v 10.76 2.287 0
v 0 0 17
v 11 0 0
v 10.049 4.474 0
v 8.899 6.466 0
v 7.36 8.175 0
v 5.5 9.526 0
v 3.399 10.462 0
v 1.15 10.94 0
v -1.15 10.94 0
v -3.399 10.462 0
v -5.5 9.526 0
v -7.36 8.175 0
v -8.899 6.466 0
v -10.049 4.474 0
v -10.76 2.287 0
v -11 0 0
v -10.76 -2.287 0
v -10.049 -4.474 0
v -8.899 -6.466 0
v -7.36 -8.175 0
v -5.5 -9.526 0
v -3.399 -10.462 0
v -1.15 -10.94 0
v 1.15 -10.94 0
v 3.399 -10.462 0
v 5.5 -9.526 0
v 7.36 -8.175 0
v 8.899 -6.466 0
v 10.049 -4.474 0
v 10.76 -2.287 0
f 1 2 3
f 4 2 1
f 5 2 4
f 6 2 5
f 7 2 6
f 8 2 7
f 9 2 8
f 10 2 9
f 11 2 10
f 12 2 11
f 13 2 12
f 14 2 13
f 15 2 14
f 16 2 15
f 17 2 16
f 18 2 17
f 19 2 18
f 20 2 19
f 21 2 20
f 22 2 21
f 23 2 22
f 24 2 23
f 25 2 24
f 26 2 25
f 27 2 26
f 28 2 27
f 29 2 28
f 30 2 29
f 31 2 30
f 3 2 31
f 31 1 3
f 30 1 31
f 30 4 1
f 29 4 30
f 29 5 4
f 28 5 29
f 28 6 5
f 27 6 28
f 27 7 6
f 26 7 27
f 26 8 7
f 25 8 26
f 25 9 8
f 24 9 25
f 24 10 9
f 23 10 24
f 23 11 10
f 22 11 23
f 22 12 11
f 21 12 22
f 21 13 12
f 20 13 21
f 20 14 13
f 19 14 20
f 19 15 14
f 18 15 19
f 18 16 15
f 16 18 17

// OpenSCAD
// Generated by SolidPython 1.0.1 on 2020-07-29 00:46:43


cylinder(h = 17, r1 = 11, r2 = 0);
/***********************************************
*********      SolidPython code:      **********
************************************************
 
# import packages: SolidPython
from solid import *
from solid.utils import *
from itertools import chain, combinations, permutations


class Resize:

    def __init__(self, scad_file):
        self.scad_file = scad_file
        #self.scad_file = import_scad(scad_file)
        # cone/cylinder param:
        self.r1 = 0
        self.r2 = 0
        self.h = 0
        # rectangular prism param:
        self.w = 0
        self.l = 0
        # ellipse param:
        self.r = 0

    # import OpenScad code (file name corresponds to shape)


    # classify shape + parameters
    def assign(self, param1, param2, param3):
        if self.scad_file == 'cone.scad':
            self.r1 = param1
            self.r2 = param2
            self.h = param3
        elif self.scad_file == 'cylinder.scad':
            self.r1 = param1
            self.r2 = param2
            self.h = param3
        elif self.scad_file == 'rectangularPrism.scad':
            self.h = param1
            self.l = param2
            self.w = param3
        else:
            self.r = param1
            self.h = param2

    # resize parameters
    def iterate(self):
        x = range(3, 20, 2)
        i = 1
        if self.scad_file == 'cone.scad':
            tempList = list(permutations(x, 2))
            for temp in tempList:
                param1 = temp[0]
                param2 = temp[1]
                filepath = 'produced_scad_files/' + 'cone' + str(param1) + '_' + str(param2) + '_' + '.scad'
                scad_render_to_file(cylinder(h=param1, r1=param2, r2=0), filepath)

        elif self.scad_file == 'cylinder.scad':
            tempList = list(permutations(x, 3))
            for temp in tempList:
                param1 = temp[0]
                param2 = temp[1]
                filepath = 'produced_scad_files/' + 'cylinder' + str(param1) + '_' + str(param2) + '_' + '.scad'
                scad_render_to_file(cylinder(h=param1, r1=param2, r2=param2), filepath)

        elif self.scad_file == 'rectangularPrism.scad':
            tempList = list(permutations(x, 3))
            for temp in tempList:
                param1 = temp[0]
                param2 = temp[1]
                param3 = temp[2]
                filepath = 'produced_scad_files/' + 'rectangularPrism' + str(param1) + '_' + str(param2) + '_' + str(
                    param3) + '.scad'
                scad_render_to_file(cube(size=(param1, param2, param3)), filepath)

        elif self.scad_file == 'ellipse.scad':
            tempList = list(permutations(x, 4))
            for temp in tempList:
                param1 = temp[0]
                param2 = temp[1]
                param3 = temp[2]
                param4 = temp[3]
                filepath = 'produced_scad_files/' + 'ellipse' + str(param1) + '_' + str(param2) + '_' + str(param3) + '_' + str(param4) + '.scad'
                scad_render_to_file(scale([param1, param2, param3])(sphere(r=param4)), filepath)

    def render_to_scadfile(self):
        scad_render_to_file(scad, 'example.scad') 
 
************************************************/
